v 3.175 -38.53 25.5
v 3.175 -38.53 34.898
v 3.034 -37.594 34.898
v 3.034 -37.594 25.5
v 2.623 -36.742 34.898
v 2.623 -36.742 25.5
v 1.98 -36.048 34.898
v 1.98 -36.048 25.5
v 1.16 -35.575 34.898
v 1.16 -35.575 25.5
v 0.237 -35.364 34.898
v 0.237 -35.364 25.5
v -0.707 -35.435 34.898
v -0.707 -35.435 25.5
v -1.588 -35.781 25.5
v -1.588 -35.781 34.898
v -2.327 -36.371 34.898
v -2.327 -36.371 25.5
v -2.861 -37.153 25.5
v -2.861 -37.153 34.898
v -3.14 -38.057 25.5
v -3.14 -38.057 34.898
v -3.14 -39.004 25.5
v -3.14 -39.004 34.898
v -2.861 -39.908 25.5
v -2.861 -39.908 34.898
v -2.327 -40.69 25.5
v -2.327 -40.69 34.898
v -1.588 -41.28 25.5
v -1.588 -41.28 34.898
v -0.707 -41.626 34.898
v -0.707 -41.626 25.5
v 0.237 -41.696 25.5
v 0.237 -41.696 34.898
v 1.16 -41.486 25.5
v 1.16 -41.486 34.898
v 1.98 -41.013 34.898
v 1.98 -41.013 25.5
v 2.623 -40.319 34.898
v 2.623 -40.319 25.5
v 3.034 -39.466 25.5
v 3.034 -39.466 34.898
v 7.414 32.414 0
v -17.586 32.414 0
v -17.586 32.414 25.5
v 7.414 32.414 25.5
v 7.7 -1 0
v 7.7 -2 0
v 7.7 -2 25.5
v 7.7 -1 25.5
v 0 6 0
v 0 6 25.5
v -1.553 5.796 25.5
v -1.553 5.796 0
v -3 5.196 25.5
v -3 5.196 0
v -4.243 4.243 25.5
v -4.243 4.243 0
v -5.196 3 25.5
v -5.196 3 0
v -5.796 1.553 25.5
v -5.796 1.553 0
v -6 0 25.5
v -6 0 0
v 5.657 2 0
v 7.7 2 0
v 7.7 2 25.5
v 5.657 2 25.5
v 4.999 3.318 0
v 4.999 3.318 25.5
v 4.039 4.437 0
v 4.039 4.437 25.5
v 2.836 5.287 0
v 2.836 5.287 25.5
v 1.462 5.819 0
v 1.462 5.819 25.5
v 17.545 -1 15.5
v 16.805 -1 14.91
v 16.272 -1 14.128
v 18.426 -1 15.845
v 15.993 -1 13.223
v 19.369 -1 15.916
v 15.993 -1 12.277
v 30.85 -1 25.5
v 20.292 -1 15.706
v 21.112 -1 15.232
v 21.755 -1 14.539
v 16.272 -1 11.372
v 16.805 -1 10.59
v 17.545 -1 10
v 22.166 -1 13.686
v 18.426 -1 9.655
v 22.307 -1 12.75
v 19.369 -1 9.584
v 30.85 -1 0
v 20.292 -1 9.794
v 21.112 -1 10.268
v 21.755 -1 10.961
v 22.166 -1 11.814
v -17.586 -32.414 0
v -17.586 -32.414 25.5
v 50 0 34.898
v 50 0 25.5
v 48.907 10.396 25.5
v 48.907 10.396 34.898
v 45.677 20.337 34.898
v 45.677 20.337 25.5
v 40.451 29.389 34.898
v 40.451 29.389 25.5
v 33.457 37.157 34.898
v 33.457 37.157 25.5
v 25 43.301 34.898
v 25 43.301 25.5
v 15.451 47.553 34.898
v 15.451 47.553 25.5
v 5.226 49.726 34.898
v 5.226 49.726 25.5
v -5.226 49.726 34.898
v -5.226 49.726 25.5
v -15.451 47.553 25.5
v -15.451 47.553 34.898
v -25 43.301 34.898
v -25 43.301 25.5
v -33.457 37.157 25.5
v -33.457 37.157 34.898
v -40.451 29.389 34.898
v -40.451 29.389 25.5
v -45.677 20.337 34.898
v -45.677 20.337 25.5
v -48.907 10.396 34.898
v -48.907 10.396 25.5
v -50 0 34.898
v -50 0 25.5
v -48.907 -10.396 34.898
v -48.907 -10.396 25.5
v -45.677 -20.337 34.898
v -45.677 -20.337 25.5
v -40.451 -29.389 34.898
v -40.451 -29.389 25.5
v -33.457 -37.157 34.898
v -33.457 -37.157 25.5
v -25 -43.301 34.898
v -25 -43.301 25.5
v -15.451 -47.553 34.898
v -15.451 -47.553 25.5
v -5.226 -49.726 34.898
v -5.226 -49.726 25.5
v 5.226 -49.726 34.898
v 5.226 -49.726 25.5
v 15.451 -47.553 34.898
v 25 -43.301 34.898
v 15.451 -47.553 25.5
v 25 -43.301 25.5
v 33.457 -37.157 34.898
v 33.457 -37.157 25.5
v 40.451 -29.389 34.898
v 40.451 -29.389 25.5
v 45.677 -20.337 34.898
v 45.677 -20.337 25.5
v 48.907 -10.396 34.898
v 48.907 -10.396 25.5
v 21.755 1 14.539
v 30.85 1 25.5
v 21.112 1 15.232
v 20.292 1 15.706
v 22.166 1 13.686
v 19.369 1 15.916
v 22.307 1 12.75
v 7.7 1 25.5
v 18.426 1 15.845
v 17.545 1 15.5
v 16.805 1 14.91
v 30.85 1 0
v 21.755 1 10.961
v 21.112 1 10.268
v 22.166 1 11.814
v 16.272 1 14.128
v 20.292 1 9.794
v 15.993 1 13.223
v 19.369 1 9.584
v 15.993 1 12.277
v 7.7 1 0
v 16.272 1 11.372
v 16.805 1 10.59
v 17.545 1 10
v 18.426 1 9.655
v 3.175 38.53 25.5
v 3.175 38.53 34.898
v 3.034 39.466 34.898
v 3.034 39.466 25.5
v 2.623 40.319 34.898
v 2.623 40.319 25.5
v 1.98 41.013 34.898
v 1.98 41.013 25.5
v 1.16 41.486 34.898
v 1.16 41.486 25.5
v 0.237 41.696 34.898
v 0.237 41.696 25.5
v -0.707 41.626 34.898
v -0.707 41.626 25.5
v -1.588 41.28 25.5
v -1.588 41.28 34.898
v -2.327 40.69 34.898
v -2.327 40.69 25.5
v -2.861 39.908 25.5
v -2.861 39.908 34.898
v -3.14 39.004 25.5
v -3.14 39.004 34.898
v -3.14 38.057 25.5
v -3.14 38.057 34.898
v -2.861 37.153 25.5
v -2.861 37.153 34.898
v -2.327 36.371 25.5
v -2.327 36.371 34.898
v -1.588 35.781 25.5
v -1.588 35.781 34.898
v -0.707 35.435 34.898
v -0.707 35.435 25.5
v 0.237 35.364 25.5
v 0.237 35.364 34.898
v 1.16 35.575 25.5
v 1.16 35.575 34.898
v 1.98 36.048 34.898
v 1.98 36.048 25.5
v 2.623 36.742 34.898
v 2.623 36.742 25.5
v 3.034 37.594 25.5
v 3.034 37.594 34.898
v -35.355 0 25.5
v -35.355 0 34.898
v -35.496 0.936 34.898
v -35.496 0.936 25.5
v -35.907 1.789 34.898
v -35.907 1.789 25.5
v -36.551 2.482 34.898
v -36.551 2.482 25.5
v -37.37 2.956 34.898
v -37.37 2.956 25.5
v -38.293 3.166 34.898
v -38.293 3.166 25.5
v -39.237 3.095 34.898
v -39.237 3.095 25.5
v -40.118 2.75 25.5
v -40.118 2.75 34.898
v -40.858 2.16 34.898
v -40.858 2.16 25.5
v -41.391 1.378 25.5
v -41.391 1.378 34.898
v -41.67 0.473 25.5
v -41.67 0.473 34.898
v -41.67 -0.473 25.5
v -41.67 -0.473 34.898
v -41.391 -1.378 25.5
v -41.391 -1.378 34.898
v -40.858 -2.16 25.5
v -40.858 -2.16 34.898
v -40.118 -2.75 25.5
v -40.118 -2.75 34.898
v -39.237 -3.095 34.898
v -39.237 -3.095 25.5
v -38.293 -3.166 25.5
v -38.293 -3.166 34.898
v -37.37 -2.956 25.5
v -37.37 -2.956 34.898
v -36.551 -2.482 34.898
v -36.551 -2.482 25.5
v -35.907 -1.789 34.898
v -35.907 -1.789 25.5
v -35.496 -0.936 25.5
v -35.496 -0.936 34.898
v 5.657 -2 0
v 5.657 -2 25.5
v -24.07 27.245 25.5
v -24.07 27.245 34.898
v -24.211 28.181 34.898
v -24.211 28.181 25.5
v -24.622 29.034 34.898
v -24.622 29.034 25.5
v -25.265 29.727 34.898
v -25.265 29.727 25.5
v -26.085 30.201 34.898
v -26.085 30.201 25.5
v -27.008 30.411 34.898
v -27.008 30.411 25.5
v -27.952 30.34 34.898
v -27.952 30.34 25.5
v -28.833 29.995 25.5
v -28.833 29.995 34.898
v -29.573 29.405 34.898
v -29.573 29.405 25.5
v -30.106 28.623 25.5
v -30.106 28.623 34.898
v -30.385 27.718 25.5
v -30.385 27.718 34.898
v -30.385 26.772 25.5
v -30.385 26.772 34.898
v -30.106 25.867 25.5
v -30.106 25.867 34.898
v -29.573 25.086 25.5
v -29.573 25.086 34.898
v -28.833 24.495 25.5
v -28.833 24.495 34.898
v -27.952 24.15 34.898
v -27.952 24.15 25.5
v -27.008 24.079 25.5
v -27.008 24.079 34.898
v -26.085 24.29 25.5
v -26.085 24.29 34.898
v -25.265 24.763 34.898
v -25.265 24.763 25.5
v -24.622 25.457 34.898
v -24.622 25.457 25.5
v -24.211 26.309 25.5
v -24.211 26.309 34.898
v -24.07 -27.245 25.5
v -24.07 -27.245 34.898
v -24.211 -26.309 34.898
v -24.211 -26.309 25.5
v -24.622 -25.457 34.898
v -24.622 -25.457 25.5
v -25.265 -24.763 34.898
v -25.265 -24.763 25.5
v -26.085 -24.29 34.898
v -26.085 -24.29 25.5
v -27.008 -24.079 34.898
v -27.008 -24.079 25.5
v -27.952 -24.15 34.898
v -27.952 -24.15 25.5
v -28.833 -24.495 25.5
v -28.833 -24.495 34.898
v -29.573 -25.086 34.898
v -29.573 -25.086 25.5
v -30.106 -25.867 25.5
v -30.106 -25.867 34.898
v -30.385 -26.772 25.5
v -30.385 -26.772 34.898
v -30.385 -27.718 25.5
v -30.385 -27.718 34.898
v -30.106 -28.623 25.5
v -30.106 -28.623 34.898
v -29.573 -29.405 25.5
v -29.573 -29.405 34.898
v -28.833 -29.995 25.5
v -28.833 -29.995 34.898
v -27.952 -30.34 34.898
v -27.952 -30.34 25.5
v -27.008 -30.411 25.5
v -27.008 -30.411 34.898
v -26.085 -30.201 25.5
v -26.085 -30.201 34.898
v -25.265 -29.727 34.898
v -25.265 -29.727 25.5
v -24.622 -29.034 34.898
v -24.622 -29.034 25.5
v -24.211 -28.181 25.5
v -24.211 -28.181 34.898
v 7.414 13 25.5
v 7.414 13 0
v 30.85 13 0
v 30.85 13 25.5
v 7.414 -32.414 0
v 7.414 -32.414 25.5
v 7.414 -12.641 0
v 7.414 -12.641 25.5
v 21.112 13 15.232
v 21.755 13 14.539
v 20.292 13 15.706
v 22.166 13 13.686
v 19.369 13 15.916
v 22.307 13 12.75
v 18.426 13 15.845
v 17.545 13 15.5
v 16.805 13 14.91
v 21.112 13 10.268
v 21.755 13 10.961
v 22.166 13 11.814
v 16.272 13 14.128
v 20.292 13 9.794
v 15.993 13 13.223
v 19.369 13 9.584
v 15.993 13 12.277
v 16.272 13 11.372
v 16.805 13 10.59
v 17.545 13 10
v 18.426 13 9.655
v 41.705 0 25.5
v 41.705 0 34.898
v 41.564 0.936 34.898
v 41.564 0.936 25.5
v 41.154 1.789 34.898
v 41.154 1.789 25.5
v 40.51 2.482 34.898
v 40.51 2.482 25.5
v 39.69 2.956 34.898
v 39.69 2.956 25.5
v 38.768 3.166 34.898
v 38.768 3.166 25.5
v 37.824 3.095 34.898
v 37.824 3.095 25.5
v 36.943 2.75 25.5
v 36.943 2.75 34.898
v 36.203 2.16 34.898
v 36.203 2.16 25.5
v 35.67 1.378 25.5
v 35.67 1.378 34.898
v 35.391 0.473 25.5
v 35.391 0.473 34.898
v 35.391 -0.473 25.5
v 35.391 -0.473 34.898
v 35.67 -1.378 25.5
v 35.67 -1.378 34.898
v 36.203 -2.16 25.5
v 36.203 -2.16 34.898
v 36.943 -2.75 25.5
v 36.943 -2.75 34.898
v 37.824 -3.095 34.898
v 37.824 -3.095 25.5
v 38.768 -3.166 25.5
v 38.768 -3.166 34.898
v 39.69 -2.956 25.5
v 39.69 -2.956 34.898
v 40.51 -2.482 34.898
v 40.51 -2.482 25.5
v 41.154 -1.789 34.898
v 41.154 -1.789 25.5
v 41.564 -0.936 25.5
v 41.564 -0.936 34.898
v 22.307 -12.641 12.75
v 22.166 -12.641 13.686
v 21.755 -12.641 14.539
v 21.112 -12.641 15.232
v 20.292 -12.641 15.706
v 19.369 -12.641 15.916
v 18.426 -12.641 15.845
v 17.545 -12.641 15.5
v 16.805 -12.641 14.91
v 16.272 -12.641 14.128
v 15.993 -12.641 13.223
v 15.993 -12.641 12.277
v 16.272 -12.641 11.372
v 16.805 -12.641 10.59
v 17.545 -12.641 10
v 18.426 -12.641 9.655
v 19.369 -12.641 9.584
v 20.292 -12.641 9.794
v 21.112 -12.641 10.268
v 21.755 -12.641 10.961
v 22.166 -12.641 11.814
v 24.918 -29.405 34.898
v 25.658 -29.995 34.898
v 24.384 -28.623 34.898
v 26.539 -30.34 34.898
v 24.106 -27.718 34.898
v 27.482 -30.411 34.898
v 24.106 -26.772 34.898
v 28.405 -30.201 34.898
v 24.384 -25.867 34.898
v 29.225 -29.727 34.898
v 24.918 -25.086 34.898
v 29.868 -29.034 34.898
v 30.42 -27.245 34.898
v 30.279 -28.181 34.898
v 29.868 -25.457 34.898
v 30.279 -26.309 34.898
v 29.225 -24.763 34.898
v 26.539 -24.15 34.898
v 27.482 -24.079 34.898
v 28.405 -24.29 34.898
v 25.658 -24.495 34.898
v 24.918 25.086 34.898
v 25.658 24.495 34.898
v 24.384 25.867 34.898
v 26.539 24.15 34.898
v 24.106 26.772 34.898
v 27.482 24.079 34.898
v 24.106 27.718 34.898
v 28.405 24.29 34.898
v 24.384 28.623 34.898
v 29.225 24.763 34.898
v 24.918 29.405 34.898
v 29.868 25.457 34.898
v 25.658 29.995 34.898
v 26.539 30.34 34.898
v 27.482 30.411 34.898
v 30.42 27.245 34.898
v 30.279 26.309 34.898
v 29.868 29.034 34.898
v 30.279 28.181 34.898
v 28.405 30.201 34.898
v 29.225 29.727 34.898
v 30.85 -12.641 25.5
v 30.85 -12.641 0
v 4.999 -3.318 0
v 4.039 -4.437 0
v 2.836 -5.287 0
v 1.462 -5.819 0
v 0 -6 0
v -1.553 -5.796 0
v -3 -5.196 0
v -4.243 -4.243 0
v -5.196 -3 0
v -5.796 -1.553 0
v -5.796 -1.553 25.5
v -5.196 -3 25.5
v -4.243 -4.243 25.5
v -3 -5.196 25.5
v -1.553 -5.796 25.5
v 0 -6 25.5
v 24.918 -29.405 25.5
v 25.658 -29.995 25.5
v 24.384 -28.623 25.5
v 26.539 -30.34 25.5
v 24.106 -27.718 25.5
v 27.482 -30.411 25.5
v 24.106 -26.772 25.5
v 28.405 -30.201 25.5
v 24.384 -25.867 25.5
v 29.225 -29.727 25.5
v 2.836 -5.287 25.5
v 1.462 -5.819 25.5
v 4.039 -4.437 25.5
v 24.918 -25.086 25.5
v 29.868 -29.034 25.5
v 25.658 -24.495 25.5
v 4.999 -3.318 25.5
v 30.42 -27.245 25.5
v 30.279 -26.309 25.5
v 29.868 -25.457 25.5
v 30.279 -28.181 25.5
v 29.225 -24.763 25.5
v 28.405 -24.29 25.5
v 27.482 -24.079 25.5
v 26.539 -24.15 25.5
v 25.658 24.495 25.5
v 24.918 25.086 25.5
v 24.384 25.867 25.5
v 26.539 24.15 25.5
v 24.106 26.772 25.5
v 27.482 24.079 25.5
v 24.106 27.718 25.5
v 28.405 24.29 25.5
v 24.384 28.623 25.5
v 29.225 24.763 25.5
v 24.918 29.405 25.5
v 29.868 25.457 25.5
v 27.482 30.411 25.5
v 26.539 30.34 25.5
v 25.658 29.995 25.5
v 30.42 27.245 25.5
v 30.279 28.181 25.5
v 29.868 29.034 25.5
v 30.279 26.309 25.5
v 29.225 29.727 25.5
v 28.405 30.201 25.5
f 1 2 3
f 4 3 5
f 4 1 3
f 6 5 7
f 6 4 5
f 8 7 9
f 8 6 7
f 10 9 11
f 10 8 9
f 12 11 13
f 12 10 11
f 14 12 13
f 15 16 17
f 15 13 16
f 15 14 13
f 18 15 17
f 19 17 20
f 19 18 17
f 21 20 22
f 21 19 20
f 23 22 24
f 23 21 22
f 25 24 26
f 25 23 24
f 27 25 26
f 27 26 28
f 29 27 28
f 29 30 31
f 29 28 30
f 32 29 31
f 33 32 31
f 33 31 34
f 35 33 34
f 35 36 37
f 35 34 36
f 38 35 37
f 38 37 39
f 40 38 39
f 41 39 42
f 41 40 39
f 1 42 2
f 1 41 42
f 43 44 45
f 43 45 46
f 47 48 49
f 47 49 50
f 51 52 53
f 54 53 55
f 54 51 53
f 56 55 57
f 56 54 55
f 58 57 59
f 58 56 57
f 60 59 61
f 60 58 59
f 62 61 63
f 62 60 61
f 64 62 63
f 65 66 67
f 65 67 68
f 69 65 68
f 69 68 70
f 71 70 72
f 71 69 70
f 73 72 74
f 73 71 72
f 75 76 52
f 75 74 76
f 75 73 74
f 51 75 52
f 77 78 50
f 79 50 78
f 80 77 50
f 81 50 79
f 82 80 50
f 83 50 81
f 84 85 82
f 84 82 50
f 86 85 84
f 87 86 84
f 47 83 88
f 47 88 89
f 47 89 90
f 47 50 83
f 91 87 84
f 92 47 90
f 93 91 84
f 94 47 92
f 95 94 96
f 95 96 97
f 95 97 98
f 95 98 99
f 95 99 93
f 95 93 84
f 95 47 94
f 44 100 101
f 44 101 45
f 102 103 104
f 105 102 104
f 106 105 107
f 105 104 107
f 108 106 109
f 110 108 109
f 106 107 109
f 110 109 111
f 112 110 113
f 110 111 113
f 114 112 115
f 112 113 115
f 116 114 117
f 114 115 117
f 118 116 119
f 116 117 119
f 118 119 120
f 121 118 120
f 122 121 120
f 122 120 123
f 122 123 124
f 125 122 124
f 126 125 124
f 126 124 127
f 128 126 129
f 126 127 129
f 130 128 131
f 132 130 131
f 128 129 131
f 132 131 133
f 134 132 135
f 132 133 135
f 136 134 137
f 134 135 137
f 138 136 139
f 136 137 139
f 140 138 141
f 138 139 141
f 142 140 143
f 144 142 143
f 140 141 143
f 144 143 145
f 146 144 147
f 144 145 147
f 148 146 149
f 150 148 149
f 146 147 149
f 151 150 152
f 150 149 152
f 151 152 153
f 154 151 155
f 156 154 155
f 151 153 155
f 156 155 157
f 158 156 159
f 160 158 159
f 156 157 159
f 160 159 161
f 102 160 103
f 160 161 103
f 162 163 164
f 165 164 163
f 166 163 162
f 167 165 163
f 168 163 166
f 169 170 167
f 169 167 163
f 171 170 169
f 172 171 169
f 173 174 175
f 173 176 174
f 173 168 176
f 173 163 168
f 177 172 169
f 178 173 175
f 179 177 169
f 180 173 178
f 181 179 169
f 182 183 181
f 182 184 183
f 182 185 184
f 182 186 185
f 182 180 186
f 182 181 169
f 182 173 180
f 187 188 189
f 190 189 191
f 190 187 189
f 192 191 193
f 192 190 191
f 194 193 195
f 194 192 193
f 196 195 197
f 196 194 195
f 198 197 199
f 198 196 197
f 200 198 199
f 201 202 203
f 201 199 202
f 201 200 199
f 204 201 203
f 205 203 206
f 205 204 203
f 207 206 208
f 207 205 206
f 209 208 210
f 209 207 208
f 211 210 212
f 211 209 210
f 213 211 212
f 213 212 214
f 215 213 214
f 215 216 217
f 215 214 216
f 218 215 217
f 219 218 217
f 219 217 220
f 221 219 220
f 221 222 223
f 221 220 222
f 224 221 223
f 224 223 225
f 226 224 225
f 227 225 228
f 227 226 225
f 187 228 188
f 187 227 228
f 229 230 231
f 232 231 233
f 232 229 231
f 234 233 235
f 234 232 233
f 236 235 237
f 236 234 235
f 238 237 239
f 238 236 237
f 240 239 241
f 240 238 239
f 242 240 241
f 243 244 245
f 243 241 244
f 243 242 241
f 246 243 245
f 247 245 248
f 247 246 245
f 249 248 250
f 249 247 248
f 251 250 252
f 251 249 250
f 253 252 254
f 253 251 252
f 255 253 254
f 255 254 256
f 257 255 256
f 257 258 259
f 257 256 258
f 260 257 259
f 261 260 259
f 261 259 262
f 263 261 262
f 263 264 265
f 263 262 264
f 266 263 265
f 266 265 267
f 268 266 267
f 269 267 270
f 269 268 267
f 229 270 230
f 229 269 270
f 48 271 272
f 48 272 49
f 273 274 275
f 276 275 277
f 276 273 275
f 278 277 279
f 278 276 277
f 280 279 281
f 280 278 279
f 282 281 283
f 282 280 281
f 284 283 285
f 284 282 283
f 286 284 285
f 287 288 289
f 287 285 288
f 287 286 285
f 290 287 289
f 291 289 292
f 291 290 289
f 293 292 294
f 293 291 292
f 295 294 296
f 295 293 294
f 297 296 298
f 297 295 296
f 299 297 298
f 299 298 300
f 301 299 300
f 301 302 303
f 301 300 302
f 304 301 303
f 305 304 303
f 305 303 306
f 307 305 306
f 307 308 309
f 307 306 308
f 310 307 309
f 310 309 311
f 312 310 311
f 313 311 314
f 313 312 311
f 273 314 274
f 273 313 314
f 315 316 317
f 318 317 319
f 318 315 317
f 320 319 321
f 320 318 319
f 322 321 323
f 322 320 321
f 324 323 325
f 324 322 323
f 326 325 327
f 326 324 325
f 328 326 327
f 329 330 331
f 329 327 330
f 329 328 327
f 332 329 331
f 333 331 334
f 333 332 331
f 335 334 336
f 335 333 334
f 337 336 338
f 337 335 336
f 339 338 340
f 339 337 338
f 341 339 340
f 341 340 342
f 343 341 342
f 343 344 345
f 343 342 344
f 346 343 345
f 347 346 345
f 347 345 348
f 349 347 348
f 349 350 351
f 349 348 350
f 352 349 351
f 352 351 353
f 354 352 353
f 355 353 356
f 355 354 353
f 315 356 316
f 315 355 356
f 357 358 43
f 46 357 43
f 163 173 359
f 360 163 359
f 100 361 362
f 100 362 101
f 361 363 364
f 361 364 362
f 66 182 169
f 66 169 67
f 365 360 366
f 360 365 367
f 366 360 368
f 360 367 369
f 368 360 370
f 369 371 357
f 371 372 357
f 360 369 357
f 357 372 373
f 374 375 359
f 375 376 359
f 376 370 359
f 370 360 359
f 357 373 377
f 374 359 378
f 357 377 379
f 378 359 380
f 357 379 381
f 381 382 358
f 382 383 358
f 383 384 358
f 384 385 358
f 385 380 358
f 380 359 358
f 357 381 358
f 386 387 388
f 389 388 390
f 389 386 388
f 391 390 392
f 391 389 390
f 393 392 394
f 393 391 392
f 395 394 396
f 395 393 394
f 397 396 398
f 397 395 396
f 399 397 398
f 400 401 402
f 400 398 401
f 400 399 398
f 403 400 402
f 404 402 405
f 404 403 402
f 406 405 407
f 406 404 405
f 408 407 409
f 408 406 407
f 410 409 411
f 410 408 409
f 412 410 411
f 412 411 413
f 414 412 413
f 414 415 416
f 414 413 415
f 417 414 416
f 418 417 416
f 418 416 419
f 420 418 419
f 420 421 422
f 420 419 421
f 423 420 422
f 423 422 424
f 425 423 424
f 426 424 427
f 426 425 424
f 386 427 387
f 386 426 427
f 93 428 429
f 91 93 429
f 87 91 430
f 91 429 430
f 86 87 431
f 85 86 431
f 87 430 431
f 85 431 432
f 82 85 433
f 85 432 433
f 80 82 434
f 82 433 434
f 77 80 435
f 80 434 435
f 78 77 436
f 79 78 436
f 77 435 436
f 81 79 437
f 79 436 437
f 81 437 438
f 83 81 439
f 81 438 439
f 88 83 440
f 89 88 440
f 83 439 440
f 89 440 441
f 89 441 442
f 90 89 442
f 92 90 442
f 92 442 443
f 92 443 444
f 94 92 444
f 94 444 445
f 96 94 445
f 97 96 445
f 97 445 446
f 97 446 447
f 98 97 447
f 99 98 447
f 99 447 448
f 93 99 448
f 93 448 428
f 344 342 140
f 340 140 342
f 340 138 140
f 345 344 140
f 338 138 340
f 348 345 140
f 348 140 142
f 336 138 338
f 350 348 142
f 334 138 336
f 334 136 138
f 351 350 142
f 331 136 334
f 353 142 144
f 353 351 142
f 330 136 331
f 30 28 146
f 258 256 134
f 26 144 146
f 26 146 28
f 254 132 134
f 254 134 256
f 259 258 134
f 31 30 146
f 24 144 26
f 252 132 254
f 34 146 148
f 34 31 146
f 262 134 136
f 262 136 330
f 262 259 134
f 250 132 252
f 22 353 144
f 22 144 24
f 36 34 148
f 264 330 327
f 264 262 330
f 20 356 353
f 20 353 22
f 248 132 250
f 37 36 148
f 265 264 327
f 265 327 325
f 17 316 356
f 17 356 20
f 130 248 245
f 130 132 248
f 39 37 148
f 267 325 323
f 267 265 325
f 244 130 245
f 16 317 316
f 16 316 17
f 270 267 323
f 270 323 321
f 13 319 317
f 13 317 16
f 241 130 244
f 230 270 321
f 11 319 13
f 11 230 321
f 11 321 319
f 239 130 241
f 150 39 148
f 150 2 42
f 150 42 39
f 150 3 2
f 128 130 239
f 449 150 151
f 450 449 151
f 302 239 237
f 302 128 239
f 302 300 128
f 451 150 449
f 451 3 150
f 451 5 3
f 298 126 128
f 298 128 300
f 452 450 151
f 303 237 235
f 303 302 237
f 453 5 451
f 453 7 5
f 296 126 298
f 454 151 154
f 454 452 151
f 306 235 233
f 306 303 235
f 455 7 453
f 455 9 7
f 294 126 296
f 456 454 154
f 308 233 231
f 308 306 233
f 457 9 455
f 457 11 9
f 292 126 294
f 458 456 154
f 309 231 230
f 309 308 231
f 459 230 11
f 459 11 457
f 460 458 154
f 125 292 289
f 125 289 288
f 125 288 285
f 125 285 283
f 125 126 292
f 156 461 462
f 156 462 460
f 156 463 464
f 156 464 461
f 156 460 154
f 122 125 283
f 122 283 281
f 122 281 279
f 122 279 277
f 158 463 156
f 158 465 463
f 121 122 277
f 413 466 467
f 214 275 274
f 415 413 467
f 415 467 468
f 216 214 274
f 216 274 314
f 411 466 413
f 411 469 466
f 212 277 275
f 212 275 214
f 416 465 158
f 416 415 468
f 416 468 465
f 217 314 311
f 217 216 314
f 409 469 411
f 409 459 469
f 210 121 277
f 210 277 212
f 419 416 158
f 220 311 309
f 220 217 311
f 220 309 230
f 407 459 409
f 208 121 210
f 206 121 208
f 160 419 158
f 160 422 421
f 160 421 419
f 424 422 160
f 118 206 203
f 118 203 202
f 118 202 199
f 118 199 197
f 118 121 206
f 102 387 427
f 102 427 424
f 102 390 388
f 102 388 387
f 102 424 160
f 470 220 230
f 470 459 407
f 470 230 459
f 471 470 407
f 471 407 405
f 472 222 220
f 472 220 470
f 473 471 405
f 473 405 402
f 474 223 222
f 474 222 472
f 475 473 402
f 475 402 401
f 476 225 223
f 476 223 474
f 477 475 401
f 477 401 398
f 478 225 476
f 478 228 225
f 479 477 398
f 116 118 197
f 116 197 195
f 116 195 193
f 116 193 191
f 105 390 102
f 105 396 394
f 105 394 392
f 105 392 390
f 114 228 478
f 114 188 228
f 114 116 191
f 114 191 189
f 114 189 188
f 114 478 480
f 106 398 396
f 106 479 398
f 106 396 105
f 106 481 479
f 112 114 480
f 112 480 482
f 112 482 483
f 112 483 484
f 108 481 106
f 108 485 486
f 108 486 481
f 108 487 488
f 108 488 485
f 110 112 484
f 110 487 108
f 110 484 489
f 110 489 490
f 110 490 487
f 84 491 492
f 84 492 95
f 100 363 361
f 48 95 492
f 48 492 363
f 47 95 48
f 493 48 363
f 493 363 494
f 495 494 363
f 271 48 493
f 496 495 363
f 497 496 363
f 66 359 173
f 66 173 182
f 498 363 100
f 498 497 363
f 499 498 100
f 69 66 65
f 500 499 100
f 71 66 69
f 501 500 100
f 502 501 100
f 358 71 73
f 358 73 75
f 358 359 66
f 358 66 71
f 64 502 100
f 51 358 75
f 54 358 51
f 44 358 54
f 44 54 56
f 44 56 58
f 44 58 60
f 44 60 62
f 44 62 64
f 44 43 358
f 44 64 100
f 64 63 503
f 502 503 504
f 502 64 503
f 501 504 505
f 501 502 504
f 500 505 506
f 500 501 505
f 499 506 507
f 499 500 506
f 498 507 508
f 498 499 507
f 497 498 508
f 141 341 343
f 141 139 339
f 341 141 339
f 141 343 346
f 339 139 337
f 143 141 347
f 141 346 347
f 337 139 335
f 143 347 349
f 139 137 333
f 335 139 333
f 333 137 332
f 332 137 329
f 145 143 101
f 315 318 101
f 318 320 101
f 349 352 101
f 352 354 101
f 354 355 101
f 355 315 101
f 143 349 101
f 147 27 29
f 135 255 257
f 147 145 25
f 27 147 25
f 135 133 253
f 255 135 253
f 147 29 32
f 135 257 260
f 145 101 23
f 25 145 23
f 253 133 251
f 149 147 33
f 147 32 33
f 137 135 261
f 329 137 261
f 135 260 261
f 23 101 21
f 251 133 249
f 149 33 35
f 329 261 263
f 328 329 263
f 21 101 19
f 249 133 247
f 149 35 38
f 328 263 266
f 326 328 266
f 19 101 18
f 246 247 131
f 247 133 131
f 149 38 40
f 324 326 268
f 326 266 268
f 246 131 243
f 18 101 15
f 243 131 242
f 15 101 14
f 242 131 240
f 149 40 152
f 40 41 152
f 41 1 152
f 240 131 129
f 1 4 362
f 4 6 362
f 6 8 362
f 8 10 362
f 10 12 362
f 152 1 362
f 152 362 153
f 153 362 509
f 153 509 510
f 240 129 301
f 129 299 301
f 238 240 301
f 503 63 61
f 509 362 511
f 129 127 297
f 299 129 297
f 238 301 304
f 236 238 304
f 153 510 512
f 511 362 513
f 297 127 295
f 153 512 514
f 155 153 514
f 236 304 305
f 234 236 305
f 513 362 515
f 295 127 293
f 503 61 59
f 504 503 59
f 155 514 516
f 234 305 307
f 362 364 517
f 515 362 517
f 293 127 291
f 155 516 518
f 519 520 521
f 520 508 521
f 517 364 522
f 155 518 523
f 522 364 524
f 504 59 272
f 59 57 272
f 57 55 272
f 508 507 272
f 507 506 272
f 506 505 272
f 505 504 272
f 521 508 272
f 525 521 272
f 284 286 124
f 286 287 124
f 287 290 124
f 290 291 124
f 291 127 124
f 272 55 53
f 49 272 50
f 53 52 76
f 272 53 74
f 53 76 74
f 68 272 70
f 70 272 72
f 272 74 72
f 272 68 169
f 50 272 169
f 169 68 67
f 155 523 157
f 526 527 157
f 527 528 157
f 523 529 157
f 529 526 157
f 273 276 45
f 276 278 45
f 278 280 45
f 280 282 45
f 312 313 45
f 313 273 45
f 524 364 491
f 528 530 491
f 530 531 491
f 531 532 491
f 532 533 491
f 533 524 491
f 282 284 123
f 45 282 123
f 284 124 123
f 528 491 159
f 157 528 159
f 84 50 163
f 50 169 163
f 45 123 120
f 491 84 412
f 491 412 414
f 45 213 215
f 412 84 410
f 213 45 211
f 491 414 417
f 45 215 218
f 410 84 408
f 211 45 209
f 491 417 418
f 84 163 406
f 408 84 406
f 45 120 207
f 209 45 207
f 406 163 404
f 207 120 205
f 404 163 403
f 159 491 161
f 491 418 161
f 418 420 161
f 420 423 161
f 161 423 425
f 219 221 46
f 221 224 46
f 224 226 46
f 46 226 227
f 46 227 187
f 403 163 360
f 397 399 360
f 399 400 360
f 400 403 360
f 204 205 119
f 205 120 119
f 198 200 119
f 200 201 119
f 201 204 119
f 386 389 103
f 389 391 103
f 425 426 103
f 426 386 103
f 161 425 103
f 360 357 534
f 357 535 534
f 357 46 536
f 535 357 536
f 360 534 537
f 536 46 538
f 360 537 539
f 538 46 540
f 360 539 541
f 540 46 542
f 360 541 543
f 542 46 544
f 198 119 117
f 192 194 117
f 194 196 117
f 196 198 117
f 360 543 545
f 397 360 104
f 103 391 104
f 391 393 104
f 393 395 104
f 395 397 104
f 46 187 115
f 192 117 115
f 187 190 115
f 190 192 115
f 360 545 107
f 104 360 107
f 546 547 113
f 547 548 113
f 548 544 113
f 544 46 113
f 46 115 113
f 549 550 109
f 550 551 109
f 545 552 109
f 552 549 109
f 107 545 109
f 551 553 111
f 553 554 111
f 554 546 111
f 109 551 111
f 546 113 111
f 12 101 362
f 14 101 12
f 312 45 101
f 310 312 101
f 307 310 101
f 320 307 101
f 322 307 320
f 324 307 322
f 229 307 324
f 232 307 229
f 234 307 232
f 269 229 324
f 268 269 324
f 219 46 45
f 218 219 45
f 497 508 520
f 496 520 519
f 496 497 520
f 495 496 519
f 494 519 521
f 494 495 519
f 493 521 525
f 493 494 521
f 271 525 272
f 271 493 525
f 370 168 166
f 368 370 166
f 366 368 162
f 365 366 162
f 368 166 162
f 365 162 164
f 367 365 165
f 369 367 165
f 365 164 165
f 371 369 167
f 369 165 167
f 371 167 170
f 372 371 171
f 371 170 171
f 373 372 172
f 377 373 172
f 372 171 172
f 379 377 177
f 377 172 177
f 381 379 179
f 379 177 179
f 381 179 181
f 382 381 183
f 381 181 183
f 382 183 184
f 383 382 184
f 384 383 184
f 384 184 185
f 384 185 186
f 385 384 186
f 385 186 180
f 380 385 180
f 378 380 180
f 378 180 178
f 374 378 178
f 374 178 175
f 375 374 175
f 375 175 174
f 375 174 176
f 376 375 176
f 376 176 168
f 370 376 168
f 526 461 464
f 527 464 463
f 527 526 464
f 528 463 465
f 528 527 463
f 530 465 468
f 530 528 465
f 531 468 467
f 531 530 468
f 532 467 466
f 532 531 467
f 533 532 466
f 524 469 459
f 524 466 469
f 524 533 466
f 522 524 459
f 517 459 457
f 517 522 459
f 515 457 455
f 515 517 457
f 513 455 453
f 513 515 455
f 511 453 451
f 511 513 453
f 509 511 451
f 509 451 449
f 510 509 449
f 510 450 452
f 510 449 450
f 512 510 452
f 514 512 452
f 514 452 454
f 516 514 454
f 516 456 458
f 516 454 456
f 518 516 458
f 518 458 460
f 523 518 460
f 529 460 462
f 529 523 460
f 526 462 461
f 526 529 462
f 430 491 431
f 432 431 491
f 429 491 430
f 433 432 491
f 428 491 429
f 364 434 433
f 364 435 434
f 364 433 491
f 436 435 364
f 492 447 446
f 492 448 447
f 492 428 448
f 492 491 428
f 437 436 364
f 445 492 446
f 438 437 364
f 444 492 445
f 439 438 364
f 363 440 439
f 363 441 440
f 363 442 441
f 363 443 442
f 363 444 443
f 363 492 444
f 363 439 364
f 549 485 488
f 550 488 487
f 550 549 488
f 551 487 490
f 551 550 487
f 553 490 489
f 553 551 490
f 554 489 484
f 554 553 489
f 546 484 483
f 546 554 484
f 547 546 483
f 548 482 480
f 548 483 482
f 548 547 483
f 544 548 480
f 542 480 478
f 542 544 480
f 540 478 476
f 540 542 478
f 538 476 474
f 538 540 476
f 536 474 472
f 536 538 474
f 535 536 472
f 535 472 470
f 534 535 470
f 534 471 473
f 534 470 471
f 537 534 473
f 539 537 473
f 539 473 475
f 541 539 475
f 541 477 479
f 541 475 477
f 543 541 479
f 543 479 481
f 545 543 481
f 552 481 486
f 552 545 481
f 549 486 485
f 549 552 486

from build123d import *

# Parameters (mm, degrees)
SKETCH_1_W           = 30
SKETCH_1_H           = 14.828427124
EXTRUDE_2_DEPTH      = 25.5
CUT_EXTRUDE_9_DEPTH  = 46
CUT_EXTRUDE_10_DEPTH = 30
CUT_EXTRUDE_11_DEPTH = 31
CUT_EXTRUDE_12_DEPTH = 40
CUT_EXTRUDE_13_DEPTH = 46
CUT_EXTRUDE_17_DEPTH = 97
CUT_EXTRUDE_18_DEPTH = 285
SKETCH_12_R          = 50
EXTRUDE_7_DEPTH      = 9.398
SKETCH_16_W          = 11
SKETCH_16_H          = 2
CUT_EXTRUDE_25_DEPTH = 25.5
SKETCH_12_5_R        = 3.175
CUT_EXTRUDE_27_DEPTH = 63
EXTRUDE_9_DEPTH      = 26
SKETCH_20_8_W        = 10
SKETCH_20_8_H        = 2
EXTRUDE_10_DEPTH     = 26
SKETCH_21_R          = 3.175
CUT_EXTRUDE_28_DEPTH = 54
SKETCH_22_W          = 23.435889716
SKETCH_22_H          = 10
CUT_EXTRUDE_31_DEPTH = 25.5
SKETCH_1_26_W        = 0.7
SKETCH_1_26_H        = 1
CUT_EXTRUDE_32_DEPTH = 25.5


with BuildPart() as part:
    # 草图1 → 凸台-拉伸2 (new body)
    with BuildSketch(Plane.XY):
        with Locations((7.585786438, 0)):
            Rectangle(SKETCH_1_W, SKETCH_1_H)
    extrude(amount=EXTRUDE_2_DEPTH)

    # 草图1<11> → 切除-拉伸9 (cut)
    with BuildSketch(Plane.XY):
        with BuildLine():
            Line((0, -2), (0, 0))
            Line((0, 0), (-6, 0))
            ThreePointArc((-6, 0), (-4.242640687, -4.242640687), (0, -6))
            ThreePointArc((0, -6), (3.464101615, -4.898979486), (5.656854249, -2))
            Line((5.656854249, -2), (0, -2))
        make_face()
    extrude(amount=CUT_EXTRUDE_9_DEPTH, mode=Mode.SUBTRACT)

    # 草图1<12> → 切除-拉伸10 (cut)
    with BuildSketch(Plane.XY):
        with BuildLine():
            Line((-6, 0), (0, 0))
            Line((0, 0), (0, 2))
            Line((0, 2), (0, 6))
            ThreePointArc((0, 6), (-4.242640687, 4.242640687), (-6, 0))
        make_face()
    extrude(amount=CUT_EXTRUDE_10_DEPTH, mode=Mode.SUBTRACT)

    # 草图1<13> → 切除-拉伸11 (cut)
    with BuildSketch(Plane.XY):
        with BuildLine():
            Line((0, 2), (0, 0))
            Line((0, 0), (6, 0))
            ThreePointArc((6, 0), (5.913591358, 1.014611872), (5.656854249, 2))
            Line((5.656854249, 2), (0, 2))
        make_face()
    extrude(amount=CUT_EXTRUDE_11_DEPTH, mode=Mode.SUBTRACT)

    # 草图1<14> → 切除-拉伸12 (cut)
    with BuildSketch(Plane.XY):
        with BuildLine():
            Line((6, 0), (0, 0))
            Line((0, 0), (0, -2))
            Line((0, -2), (5.656854249, -2))
            ThreePointArc((5.656854249, -2), (5.913591358, -1.014611872), (6, 0))
        make_face()
    extrude(amount=CUT_EXTRUDE_12_DEPTH, mode=Mode.SUBTRACT)

    # 草图1<15> → 切除-拉伸13 (cut)
    with BuildSketch(Plane.XY):
        with BuildLine():
            Line((0, 6), (0, 2))
            Line((0, 2), (5.656854249, 2))
            ThreePointArc((5.656854249, 2), (3.464101615, 4.898979486), (0, 6))
        make_face()
    extrude(amount=CUT_EXTRUDE_13_DEPTH, mode=Mode.SUBTRACT)

    # 草图1<19> → 切除-拉伸17 (cut)
    with BuildSketch(Plane.XY):
        with BuildLine():
            Line((7, 2), (5.656854249, 2))
            ThreePointArc((5.656854249, 2), (6, 0), (5.656854249, -2))
            Line((5.656854249, -2), (7, -2))
            Line((7, -2), (7, 2))
        make_face()
    extrude(amount=CUT_EXTRUDE_17_DEPTH, mode=Mode.SUBTRACT)

    # 草图1<20> → 切除-拉伸18 (cut)
    with BuildSketch(Plane.XY):
        with BuildLine():
            ThreePointArc((7.414213562, 7.414213562), (9.005239827, 5.370919954), (10.046946078, 3))
            Line((10.046946078, 3), (18, 3))
            Line((18, 3), (20.850103278, 3))
            Line((20.850103278, 3), (20.850103278, 1))
            Line((20.850103278, 1), (18, 1))
            Line((18, 1), (18, -1))
            Line((18, -1), (20.850103278, -1))
            Line((20.850103278, -1), (20.850103278, -3))
            Line((20.850103278, -3), (18, -3))
            Line((18, -3), (10.046946078, -3))
            ThreePointArc((10.046946078, -3), (9.005239827, -5.370919954), (7.414213562, -7.414213562))
            Line((7.414213562, -7.414213562), (22.585786438, -7.414213562))
            Line((22.585786438, -7.414213562), (22.585786438, 7.414213562))
            Line((22.585786438, 7.414213562), (7.414213562, 7.414213562))
        make_face()
    extrude(amount=CUT_EXTRUDE_18_DEPTH, mode=Mode.SUBTRACT)

    # 草图12 → 凸台-拉伸7 (add)
    with BuildSketch(Plane.XY.offset(25.5)):
        Circle(SKETCH_12_R)
    extrude(amount=EXTRUDE_7_DEPTH)

    # 草图16 → 切除-拉伸25 (cut)
    with BuildSketch(Plane(origin=(0, 0, 0), x_dir=(-1, 0, 0), z_dir=(0, 0, -1))):
        with Locations((-12.5, 0)):
            Rectangle(SKETCH_16_W, SKETCH_16_H)
    extrude(amount=-CUT_EXTRUDE_25_DEPTH, mode=Mode.SUBTRACT)

    # 草图12<5> → 切除-拉伸27 (cut)
    with BuildSketch(Plane.XY.offset(25.5)):
        with Locations((0, 38.530339059)):
            Circle(SKETCH_12_5_R)
        with Locations((-27.24506403, 27.24506403)):
            Circle(SKETCH_12_5_R)
        with Locations((27.24506403, -27.24506403)):
            Circle(SKETCH_12_5_R)
        with Locations((-38.530339059, 0)):
            Circle(SKETCH_12_5_R)
        with Locations((38.530339059, 0)):
            Circle(SKETCH_12_5_R)
        with Locations((0, -38.530339059)):
            Circle(SKETCH_12_5_R)
        with Locations((-27.24506403, -27.24506403)):
            Circle(SKETCH_12_5_R)
        with Locations((27.24506403, 27.24506403)):
            Circle(SKETCH_12_5_R)
    extrude(amount=CUT_EXTRUDE_27_DEPTH, mode=Mode.SUBTRACT)

    # 草图20 → 凸台-拉伸9 (add)
    with BuildSketch(Plane(origin=(0, 0, 0), x_dir=(-1, 0, 0), z_dir=(0, 0, -1))):
        Polygon((-7.414213562, 32.414213562), (-7.414213562, 23), (-30.850103278, 23), (-30.850103278, 3), (-7.414213562, 3), (-7.414213562, 7.414213562), (7.414213562, 7.414213562), (7.414213562, -7.414213562), (-7.414213562, -7.414213562), (-7.414213562, -3), (-30.850103278, -3), (-30.850103278, -22.641492006), (-7.414213562, -22.641492006), (-7.414213562, -32.414213562), (17.585786438, -32.414213562), (17.585786438, 32.414213562), align=None)
    extrude(amount=-EXTRUDE_9_DEPTH)

    # 草图20<8> → 凸台-拉伸10 (add)
    with BuildSketch(Plane(origin=(0, 0, 0), x_dir=(-1, 0, 0), z_dir=(0, 0, -1))):
        with Locations((-25.850103278, 2)):
            Rectangle(SKETCH_20_8_W, SKETCH_20_8_H)
        with Locations((-25.850103278, -2)):
            Rectangle(SKETCH_20_8_W, SKETCH_20_8_H)
    extrude(amount=-EXTRUDE_10_DEPTH)

    # 草图21 → 切除-拉伸28 (cut)
    with BuildSketch(Plane.XZ.offset(22.641492006)):
        with Locations((19.13215842, 12.75)):
            Circle(SKETCH_21_R)
    extrude(amount=-CUT_EXTRUDE_28_DEPTH, mode=Mode.SUBTRACT)

    # 草图22 → 切除-拉伸31 (cut)
    with BuildSketch(Plane(origin=(0, 0, 0), x_dir=(-1, 0, 0), z_dir=(0, 0, -1))):
        with Locations((-19.13215842, -17.641492006)):
            Rectangle(SKETCH_22_W, SKETCH_22_H)
        with Locations((-19.13215842, 18)):
            Rectangle(SKETCH_22_W, SKETCH_22_H)
    extrude(amount=-CUT_EXTRUDE_31_DEPTH, mode=Mode.SUBTRACT)

    # 草图1<26> → 切除-拉伸32 (cut)
    with BuildSketch(Plane.XY):
        with Locations((7.35, -1.5)):
            Rectangle(SKETCH_1_26_W, SKETCH_1_26_H)
        with Locations((7.35, 1.5)):
            Rectangle(SKETCH_1_26_W, SKETCH_1_26_H)
    extrude(amount=CUT_EXTRUDE_32_DEPTH, mode=Mode.SUBTRACT)


solid = part.part
